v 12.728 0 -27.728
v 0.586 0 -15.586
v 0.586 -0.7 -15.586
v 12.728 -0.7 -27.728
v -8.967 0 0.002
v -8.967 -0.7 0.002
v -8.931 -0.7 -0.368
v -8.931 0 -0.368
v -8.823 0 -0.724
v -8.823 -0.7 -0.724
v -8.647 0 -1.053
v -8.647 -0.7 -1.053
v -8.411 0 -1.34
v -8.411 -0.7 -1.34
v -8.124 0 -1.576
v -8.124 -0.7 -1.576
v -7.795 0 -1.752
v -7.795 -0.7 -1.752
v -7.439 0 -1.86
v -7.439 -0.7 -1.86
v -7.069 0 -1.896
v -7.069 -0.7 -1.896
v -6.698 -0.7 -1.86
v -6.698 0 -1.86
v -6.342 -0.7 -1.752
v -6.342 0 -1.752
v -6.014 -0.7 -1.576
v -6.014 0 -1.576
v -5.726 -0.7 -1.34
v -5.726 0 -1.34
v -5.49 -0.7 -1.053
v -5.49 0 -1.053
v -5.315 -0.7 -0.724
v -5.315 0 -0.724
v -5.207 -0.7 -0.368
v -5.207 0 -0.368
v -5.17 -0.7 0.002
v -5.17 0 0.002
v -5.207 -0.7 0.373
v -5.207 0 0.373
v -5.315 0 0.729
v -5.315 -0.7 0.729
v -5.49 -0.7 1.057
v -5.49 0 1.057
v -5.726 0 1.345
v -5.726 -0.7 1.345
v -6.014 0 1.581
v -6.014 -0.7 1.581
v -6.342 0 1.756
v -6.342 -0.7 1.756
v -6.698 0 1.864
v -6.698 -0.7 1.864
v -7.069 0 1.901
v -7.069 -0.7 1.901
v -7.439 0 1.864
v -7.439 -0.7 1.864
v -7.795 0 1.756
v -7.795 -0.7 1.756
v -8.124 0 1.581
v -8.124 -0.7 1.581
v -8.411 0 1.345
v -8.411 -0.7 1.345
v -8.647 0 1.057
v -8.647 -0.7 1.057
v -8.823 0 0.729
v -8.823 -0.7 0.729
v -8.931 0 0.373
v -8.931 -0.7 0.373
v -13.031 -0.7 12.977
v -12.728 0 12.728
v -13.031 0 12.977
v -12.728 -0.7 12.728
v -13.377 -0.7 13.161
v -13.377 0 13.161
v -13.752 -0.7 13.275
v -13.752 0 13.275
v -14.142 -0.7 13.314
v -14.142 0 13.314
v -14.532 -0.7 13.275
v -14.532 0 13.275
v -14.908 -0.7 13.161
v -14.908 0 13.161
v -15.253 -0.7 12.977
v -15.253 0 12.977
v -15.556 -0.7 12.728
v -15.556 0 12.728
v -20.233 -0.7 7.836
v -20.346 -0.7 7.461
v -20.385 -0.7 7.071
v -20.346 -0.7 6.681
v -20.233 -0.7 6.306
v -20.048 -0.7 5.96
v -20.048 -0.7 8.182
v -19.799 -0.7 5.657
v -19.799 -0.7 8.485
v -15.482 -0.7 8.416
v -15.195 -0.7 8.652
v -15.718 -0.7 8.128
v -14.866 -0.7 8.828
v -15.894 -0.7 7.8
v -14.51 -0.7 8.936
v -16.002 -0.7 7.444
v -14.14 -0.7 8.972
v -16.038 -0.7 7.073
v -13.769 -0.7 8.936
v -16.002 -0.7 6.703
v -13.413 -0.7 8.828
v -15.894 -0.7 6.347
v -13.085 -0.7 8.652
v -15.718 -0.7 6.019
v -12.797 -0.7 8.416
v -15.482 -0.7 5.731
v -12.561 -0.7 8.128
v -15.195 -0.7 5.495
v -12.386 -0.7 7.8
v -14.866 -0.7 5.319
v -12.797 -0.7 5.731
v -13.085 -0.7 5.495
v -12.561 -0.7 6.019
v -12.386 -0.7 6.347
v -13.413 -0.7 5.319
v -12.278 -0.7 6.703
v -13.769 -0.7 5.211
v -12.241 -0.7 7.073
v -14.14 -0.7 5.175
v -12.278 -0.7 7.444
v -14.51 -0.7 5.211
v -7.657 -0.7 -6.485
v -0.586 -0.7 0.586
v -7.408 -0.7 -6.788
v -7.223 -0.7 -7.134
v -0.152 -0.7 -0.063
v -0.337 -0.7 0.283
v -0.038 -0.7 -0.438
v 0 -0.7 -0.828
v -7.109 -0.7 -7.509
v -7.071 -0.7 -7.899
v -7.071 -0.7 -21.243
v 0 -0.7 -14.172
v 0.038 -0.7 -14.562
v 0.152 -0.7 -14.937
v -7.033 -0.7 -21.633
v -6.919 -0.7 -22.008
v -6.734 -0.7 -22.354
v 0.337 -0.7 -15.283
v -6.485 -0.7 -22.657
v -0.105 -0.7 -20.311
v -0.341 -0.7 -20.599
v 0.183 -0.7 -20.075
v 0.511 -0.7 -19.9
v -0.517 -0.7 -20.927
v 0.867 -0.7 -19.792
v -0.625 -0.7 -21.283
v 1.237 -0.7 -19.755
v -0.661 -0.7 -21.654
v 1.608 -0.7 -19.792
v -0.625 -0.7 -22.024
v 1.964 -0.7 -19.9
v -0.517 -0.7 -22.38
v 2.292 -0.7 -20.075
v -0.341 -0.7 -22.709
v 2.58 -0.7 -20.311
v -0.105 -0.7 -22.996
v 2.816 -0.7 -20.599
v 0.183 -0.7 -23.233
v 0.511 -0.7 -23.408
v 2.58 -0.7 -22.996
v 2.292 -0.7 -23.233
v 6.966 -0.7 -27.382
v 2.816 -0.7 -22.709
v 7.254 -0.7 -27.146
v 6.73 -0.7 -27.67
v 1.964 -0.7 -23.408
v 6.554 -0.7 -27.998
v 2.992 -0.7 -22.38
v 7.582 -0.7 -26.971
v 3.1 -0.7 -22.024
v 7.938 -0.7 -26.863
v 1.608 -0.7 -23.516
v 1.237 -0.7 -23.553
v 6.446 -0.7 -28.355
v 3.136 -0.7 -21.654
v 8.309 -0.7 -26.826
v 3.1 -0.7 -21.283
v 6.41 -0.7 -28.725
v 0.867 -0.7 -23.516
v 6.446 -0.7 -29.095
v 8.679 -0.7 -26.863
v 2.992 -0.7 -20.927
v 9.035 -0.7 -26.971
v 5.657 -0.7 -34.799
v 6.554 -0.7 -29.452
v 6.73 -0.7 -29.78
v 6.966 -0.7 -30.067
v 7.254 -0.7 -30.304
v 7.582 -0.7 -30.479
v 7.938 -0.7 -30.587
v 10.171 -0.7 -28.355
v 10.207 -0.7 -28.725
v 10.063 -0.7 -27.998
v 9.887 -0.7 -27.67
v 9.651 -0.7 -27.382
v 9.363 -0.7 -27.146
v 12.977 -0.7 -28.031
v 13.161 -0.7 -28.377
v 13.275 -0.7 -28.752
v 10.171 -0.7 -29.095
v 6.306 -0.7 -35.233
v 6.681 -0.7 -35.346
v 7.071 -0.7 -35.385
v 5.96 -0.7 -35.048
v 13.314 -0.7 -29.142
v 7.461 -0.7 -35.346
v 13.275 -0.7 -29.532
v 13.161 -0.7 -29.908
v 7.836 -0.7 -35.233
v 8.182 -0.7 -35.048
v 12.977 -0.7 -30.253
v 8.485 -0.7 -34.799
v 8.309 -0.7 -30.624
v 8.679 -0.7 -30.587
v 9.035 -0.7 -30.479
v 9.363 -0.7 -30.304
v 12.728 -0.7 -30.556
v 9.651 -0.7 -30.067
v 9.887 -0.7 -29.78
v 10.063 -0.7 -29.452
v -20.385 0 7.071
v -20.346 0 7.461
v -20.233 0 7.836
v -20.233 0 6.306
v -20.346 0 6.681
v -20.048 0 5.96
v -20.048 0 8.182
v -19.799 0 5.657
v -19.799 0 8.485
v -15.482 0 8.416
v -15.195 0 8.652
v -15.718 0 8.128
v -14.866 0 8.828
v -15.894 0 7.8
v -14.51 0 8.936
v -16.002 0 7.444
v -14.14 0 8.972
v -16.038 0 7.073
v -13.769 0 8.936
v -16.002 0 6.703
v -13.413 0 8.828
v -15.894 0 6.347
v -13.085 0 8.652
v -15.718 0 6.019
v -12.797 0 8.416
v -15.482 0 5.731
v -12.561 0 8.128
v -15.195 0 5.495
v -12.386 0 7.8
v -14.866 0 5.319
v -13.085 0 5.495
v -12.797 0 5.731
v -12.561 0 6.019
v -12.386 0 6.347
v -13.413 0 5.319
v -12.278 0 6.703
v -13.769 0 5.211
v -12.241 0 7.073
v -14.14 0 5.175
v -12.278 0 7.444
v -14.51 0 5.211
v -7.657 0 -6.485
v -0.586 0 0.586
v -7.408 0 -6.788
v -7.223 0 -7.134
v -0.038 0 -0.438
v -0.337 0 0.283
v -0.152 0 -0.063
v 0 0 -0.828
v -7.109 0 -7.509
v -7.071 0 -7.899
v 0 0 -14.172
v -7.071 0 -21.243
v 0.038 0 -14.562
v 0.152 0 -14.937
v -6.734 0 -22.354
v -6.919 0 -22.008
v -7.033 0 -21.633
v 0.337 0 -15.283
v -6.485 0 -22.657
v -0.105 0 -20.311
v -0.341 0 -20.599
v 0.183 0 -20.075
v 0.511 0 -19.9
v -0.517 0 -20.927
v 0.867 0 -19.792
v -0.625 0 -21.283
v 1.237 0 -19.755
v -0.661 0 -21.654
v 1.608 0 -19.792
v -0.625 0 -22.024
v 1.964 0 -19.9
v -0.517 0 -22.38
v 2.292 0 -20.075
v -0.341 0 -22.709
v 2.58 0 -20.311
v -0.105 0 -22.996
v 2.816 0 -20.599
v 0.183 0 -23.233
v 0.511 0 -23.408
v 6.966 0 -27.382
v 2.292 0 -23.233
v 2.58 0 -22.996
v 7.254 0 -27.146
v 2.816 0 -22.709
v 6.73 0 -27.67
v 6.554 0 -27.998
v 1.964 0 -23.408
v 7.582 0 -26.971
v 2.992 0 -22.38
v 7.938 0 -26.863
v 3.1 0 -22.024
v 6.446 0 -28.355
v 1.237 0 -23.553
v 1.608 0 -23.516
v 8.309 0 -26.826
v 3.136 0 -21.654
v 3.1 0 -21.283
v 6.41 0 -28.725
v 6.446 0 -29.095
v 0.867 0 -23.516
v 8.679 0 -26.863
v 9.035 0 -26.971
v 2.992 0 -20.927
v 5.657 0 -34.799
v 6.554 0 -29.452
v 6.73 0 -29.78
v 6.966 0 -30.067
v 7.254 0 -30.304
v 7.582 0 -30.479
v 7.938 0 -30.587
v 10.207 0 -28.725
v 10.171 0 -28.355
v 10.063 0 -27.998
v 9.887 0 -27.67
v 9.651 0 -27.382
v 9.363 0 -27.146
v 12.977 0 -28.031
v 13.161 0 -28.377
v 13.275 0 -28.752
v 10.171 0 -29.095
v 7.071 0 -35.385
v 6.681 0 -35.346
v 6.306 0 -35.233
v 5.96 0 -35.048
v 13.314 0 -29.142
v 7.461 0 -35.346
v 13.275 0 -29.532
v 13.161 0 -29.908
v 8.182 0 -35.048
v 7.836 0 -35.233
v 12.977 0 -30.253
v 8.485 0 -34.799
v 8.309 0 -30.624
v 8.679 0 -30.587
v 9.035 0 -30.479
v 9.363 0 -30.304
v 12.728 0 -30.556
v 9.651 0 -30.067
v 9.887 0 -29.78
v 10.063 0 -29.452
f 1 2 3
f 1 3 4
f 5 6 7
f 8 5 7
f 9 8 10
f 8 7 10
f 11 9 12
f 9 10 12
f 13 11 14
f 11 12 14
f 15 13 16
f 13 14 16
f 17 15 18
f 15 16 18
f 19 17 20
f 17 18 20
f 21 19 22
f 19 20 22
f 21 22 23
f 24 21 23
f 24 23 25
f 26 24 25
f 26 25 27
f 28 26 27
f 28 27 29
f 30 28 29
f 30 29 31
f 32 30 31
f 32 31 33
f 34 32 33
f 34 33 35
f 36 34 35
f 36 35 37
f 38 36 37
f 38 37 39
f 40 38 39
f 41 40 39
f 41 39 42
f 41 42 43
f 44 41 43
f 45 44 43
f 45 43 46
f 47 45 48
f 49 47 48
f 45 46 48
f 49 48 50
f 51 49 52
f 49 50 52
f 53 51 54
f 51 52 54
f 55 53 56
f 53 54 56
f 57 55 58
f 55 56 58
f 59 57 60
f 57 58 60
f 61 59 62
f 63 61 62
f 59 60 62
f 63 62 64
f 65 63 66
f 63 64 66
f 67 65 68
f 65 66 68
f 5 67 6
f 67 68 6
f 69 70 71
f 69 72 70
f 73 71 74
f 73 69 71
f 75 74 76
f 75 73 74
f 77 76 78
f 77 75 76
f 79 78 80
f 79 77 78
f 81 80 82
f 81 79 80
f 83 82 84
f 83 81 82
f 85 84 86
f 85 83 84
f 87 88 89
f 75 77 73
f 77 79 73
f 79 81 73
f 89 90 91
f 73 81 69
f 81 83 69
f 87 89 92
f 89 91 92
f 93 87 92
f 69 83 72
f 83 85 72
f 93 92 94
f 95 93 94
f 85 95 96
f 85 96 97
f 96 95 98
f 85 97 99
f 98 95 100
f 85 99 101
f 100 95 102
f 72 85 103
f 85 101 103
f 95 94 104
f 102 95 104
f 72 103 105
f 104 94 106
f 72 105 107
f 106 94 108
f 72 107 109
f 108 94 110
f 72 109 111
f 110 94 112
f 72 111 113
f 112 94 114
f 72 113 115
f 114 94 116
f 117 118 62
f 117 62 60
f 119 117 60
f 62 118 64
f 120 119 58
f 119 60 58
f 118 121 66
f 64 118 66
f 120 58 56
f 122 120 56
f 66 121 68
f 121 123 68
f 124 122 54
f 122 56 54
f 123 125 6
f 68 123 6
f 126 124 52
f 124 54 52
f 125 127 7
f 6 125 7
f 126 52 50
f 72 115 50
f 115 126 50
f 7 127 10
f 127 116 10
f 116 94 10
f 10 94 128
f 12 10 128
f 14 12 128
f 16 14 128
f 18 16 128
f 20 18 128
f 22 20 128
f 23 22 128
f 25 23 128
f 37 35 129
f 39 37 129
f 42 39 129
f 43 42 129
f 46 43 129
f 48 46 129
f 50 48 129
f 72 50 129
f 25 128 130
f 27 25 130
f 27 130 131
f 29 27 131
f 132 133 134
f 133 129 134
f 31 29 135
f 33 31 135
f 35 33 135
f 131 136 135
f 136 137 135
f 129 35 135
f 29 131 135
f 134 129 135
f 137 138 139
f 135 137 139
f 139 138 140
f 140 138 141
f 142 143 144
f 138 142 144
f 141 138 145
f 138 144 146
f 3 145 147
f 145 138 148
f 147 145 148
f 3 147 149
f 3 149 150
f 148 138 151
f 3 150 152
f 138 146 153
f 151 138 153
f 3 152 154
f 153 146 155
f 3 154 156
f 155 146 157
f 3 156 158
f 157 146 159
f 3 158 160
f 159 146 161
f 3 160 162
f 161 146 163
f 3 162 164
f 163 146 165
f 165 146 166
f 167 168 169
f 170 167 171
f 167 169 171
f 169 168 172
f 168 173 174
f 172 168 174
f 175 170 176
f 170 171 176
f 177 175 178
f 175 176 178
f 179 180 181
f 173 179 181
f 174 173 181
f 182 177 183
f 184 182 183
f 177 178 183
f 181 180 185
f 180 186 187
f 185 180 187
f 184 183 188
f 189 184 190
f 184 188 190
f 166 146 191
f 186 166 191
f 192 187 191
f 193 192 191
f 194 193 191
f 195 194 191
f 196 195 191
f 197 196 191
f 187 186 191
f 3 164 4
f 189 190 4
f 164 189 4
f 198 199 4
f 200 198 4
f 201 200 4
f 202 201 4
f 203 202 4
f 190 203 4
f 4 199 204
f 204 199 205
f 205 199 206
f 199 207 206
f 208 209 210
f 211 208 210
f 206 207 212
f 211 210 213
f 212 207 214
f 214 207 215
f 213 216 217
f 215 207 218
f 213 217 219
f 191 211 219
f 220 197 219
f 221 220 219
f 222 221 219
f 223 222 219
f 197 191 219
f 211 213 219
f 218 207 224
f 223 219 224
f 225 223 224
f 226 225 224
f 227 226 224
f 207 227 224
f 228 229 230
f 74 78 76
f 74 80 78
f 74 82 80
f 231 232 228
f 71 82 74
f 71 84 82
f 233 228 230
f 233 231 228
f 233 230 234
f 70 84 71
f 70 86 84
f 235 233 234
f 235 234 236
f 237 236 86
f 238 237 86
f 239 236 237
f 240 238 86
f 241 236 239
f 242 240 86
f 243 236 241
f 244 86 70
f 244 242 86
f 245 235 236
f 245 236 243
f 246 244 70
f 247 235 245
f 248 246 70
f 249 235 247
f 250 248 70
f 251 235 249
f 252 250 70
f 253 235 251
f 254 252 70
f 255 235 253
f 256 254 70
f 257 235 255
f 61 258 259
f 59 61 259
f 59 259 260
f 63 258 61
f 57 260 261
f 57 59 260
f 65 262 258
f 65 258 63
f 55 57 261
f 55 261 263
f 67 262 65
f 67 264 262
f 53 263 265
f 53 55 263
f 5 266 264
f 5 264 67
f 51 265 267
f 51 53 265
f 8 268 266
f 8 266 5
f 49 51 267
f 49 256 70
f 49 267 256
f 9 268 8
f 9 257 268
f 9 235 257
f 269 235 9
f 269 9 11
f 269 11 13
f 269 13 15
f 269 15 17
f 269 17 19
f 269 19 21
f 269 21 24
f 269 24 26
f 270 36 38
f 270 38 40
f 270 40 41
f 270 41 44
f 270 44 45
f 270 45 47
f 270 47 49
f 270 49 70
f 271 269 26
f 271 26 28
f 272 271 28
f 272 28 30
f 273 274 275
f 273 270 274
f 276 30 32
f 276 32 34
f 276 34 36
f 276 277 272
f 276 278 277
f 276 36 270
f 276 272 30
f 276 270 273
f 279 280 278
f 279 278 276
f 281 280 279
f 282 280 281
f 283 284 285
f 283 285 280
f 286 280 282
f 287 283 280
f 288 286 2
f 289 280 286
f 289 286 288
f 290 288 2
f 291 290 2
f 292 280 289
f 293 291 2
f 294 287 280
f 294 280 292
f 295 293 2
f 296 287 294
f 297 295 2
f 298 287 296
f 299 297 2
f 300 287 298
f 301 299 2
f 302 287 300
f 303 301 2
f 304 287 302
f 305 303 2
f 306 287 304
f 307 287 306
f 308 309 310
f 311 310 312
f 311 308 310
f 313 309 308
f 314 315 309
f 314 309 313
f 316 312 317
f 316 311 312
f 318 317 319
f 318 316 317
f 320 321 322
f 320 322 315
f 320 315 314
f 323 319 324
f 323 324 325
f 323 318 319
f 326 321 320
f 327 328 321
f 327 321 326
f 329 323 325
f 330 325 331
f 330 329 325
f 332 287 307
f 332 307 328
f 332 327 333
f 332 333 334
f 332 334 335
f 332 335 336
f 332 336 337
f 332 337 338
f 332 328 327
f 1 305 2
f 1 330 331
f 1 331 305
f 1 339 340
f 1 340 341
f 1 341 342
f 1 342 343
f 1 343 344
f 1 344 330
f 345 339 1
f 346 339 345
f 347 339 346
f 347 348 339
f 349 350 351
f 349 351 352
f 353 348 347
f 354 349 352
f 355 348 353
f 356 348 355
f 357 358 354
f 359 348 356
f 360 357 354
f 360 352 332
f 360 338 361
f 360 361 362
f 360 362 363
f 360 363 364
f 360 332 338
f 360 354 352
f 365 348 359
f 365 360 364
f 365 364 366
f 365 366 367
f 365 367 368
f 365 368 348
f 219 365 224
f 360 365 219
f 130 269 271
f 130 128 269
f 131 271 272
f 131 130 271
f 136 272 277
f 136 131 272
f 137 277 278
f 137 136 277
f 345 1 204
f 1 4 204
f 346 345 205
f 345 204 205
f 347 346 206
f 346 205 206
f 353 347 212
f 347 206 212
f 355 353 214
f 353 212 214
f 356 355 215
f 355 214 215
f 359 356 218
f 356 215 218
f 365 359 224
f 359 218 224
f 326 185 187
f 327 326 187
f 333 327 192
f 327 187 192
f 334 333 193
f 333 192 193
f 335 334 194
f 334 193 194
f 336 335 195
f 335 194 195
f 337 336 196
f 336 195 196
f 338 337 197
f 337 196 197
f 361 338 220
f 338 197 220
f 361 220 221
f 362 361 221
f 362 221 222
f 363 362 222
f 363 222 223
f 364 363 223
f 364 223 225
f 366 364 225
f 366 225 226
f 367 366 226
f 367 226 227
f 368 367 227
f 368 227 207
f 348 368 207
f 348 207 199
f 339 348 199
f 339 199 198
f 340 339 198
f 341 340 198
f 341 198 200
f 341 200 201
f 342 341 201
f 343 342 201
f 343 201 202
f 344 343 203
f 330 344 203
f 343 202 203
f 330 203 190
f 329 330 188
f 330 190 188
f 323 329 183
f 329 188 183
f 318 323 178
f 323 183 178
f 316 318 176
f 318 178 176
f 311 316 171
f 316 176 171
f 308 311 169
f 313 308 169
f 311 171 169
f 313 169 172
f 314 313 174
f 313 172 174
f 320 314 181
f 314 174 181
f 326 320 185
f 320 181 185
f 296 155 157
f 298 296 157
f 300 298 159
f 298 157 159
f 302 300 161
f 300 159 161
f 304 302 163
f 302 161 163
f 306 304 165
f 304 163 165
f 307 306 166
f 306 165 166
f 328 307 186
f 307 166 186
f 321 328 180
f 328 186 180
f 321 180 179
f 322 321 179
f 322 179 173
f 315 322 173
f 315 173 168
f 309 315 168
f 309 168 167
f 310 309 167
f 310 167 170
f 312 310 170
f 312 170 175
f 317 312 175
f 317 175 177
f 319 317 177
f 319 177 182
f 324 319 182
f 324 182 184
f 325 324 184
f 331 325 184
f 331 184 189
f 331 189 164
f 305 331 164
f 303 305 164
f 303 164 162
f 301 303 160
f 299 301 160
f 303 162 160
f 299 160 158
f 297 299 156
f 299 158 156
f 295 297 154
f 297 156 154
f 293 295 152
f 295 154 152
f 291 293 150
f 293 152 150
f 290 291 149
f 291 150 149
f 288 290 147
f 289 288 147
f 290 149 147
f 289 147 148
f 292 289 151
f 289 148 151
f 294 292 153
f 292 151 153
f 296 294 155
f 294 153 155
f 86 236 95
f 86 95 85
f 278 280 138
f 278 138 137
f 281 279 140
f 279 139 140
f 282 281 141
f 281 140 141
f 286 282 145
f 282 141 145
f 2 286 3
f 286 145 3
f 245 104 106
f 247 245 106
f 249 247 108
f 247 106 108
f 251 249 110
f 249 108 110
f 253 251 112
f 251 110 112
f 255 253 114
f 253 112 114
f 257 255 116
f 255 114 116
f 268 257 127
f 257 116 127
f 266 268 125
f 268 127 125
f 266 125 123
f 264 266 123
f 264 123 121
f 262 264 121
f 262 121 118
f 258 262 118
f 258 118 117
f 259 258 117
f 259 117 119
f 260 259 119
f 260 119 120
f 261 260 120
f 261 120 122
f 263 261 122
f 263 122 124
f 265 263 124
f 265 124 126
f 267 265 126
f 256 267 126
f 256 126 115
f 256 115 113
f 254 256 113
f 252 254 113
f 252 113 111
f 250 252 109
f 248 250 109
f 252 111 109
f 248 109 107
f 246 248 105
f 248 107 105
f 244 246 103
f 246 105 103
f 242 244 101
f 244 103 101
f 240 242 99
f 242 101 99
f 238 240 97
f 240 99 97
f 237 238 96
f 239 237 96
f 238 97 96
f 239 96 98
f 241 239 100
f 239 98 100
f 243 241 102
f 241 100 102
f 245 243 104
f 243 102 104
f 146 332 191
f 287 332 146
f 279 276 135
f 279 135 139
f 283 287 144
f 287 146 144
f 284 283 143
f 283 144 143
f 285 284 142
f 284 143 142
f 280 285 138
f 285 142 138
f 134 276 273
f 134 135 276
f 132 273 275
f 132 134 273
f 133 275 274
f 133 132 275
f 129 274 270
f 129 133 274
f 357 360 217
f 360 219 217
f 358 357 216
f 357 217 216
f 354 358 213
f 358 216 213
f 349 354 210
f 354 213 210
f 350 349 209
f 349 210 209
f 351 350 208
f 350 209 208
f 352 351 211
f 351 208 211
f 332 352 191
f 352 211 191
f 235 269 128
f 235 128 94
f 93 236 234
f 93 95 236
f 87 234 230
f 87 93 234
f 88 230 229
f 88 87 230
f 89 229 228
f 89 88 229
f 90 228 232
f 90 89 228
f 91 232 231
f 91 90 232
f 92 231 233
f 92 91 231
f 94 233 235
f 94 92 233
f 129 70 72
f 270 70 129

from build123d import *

# Parameters (mm, degrees)
BASE_FLANGE2_DEPTH    = 0.7
F_6_CLEARANCE_HOLE1_D = 3.7973
FILLET1_R             = 2


# Sheet-metal steps are written as plain solids
with BuildPart() as part:
    # Sketch1 → Base-Flange2 (new body)
    with BuildSketch(Plane(origin=(0, 0, 0), x_dir=(1, 0, 0), z_dir=(0, 1, 0))):
        Polygon((0, 0), (0, 15), (14.142135624, 29.142135624), (7.071067812, 36.213203436), (-7.071067812, 22.071067812), (-7.071067812, 7.071067812), (-21.213203436, -7.071067812), (-14.142135624, -14.142135624), align=None)
    extrude(amount=-BASE_FLANGE2_DEPTH)

    # #6 Clearance Hole1 (through all)
    with Locations(Plane(origin=(0, 0, 0), x_dir=(1, 0, 0), z_dir=(0, 1, 0))):
        with Locations((-14.139821541, -7.073381895), (-7.068753729, -0.002314083), (1.237436867, 21.653874811), (8.308504679, 28.724942623)):
            Hole(F_6_CLEARANCE_HOLE1_D / 2)

    # Fillet1
    fillet1_edges = [part.edges().sort_by_distance(p)[0] for p in [
        (-14.142135624, -0.35, 14.142135624),
        (-21.213203436, -0.35, 7.071067812),
        (-7.071067812, -0.35, -7.071067812),
        (-7.071067812, -0.35, -22.071067812),
        (7.071067812, -0.35, -36.213203436),
        (14.142135624, -0.35, -29.142135624),
        (0, -0.35, -15),
        (0, -0.35, 0),
    ]]
    fillet(fillet1_edges, radius=FILLET1_R)


solid = part.part
